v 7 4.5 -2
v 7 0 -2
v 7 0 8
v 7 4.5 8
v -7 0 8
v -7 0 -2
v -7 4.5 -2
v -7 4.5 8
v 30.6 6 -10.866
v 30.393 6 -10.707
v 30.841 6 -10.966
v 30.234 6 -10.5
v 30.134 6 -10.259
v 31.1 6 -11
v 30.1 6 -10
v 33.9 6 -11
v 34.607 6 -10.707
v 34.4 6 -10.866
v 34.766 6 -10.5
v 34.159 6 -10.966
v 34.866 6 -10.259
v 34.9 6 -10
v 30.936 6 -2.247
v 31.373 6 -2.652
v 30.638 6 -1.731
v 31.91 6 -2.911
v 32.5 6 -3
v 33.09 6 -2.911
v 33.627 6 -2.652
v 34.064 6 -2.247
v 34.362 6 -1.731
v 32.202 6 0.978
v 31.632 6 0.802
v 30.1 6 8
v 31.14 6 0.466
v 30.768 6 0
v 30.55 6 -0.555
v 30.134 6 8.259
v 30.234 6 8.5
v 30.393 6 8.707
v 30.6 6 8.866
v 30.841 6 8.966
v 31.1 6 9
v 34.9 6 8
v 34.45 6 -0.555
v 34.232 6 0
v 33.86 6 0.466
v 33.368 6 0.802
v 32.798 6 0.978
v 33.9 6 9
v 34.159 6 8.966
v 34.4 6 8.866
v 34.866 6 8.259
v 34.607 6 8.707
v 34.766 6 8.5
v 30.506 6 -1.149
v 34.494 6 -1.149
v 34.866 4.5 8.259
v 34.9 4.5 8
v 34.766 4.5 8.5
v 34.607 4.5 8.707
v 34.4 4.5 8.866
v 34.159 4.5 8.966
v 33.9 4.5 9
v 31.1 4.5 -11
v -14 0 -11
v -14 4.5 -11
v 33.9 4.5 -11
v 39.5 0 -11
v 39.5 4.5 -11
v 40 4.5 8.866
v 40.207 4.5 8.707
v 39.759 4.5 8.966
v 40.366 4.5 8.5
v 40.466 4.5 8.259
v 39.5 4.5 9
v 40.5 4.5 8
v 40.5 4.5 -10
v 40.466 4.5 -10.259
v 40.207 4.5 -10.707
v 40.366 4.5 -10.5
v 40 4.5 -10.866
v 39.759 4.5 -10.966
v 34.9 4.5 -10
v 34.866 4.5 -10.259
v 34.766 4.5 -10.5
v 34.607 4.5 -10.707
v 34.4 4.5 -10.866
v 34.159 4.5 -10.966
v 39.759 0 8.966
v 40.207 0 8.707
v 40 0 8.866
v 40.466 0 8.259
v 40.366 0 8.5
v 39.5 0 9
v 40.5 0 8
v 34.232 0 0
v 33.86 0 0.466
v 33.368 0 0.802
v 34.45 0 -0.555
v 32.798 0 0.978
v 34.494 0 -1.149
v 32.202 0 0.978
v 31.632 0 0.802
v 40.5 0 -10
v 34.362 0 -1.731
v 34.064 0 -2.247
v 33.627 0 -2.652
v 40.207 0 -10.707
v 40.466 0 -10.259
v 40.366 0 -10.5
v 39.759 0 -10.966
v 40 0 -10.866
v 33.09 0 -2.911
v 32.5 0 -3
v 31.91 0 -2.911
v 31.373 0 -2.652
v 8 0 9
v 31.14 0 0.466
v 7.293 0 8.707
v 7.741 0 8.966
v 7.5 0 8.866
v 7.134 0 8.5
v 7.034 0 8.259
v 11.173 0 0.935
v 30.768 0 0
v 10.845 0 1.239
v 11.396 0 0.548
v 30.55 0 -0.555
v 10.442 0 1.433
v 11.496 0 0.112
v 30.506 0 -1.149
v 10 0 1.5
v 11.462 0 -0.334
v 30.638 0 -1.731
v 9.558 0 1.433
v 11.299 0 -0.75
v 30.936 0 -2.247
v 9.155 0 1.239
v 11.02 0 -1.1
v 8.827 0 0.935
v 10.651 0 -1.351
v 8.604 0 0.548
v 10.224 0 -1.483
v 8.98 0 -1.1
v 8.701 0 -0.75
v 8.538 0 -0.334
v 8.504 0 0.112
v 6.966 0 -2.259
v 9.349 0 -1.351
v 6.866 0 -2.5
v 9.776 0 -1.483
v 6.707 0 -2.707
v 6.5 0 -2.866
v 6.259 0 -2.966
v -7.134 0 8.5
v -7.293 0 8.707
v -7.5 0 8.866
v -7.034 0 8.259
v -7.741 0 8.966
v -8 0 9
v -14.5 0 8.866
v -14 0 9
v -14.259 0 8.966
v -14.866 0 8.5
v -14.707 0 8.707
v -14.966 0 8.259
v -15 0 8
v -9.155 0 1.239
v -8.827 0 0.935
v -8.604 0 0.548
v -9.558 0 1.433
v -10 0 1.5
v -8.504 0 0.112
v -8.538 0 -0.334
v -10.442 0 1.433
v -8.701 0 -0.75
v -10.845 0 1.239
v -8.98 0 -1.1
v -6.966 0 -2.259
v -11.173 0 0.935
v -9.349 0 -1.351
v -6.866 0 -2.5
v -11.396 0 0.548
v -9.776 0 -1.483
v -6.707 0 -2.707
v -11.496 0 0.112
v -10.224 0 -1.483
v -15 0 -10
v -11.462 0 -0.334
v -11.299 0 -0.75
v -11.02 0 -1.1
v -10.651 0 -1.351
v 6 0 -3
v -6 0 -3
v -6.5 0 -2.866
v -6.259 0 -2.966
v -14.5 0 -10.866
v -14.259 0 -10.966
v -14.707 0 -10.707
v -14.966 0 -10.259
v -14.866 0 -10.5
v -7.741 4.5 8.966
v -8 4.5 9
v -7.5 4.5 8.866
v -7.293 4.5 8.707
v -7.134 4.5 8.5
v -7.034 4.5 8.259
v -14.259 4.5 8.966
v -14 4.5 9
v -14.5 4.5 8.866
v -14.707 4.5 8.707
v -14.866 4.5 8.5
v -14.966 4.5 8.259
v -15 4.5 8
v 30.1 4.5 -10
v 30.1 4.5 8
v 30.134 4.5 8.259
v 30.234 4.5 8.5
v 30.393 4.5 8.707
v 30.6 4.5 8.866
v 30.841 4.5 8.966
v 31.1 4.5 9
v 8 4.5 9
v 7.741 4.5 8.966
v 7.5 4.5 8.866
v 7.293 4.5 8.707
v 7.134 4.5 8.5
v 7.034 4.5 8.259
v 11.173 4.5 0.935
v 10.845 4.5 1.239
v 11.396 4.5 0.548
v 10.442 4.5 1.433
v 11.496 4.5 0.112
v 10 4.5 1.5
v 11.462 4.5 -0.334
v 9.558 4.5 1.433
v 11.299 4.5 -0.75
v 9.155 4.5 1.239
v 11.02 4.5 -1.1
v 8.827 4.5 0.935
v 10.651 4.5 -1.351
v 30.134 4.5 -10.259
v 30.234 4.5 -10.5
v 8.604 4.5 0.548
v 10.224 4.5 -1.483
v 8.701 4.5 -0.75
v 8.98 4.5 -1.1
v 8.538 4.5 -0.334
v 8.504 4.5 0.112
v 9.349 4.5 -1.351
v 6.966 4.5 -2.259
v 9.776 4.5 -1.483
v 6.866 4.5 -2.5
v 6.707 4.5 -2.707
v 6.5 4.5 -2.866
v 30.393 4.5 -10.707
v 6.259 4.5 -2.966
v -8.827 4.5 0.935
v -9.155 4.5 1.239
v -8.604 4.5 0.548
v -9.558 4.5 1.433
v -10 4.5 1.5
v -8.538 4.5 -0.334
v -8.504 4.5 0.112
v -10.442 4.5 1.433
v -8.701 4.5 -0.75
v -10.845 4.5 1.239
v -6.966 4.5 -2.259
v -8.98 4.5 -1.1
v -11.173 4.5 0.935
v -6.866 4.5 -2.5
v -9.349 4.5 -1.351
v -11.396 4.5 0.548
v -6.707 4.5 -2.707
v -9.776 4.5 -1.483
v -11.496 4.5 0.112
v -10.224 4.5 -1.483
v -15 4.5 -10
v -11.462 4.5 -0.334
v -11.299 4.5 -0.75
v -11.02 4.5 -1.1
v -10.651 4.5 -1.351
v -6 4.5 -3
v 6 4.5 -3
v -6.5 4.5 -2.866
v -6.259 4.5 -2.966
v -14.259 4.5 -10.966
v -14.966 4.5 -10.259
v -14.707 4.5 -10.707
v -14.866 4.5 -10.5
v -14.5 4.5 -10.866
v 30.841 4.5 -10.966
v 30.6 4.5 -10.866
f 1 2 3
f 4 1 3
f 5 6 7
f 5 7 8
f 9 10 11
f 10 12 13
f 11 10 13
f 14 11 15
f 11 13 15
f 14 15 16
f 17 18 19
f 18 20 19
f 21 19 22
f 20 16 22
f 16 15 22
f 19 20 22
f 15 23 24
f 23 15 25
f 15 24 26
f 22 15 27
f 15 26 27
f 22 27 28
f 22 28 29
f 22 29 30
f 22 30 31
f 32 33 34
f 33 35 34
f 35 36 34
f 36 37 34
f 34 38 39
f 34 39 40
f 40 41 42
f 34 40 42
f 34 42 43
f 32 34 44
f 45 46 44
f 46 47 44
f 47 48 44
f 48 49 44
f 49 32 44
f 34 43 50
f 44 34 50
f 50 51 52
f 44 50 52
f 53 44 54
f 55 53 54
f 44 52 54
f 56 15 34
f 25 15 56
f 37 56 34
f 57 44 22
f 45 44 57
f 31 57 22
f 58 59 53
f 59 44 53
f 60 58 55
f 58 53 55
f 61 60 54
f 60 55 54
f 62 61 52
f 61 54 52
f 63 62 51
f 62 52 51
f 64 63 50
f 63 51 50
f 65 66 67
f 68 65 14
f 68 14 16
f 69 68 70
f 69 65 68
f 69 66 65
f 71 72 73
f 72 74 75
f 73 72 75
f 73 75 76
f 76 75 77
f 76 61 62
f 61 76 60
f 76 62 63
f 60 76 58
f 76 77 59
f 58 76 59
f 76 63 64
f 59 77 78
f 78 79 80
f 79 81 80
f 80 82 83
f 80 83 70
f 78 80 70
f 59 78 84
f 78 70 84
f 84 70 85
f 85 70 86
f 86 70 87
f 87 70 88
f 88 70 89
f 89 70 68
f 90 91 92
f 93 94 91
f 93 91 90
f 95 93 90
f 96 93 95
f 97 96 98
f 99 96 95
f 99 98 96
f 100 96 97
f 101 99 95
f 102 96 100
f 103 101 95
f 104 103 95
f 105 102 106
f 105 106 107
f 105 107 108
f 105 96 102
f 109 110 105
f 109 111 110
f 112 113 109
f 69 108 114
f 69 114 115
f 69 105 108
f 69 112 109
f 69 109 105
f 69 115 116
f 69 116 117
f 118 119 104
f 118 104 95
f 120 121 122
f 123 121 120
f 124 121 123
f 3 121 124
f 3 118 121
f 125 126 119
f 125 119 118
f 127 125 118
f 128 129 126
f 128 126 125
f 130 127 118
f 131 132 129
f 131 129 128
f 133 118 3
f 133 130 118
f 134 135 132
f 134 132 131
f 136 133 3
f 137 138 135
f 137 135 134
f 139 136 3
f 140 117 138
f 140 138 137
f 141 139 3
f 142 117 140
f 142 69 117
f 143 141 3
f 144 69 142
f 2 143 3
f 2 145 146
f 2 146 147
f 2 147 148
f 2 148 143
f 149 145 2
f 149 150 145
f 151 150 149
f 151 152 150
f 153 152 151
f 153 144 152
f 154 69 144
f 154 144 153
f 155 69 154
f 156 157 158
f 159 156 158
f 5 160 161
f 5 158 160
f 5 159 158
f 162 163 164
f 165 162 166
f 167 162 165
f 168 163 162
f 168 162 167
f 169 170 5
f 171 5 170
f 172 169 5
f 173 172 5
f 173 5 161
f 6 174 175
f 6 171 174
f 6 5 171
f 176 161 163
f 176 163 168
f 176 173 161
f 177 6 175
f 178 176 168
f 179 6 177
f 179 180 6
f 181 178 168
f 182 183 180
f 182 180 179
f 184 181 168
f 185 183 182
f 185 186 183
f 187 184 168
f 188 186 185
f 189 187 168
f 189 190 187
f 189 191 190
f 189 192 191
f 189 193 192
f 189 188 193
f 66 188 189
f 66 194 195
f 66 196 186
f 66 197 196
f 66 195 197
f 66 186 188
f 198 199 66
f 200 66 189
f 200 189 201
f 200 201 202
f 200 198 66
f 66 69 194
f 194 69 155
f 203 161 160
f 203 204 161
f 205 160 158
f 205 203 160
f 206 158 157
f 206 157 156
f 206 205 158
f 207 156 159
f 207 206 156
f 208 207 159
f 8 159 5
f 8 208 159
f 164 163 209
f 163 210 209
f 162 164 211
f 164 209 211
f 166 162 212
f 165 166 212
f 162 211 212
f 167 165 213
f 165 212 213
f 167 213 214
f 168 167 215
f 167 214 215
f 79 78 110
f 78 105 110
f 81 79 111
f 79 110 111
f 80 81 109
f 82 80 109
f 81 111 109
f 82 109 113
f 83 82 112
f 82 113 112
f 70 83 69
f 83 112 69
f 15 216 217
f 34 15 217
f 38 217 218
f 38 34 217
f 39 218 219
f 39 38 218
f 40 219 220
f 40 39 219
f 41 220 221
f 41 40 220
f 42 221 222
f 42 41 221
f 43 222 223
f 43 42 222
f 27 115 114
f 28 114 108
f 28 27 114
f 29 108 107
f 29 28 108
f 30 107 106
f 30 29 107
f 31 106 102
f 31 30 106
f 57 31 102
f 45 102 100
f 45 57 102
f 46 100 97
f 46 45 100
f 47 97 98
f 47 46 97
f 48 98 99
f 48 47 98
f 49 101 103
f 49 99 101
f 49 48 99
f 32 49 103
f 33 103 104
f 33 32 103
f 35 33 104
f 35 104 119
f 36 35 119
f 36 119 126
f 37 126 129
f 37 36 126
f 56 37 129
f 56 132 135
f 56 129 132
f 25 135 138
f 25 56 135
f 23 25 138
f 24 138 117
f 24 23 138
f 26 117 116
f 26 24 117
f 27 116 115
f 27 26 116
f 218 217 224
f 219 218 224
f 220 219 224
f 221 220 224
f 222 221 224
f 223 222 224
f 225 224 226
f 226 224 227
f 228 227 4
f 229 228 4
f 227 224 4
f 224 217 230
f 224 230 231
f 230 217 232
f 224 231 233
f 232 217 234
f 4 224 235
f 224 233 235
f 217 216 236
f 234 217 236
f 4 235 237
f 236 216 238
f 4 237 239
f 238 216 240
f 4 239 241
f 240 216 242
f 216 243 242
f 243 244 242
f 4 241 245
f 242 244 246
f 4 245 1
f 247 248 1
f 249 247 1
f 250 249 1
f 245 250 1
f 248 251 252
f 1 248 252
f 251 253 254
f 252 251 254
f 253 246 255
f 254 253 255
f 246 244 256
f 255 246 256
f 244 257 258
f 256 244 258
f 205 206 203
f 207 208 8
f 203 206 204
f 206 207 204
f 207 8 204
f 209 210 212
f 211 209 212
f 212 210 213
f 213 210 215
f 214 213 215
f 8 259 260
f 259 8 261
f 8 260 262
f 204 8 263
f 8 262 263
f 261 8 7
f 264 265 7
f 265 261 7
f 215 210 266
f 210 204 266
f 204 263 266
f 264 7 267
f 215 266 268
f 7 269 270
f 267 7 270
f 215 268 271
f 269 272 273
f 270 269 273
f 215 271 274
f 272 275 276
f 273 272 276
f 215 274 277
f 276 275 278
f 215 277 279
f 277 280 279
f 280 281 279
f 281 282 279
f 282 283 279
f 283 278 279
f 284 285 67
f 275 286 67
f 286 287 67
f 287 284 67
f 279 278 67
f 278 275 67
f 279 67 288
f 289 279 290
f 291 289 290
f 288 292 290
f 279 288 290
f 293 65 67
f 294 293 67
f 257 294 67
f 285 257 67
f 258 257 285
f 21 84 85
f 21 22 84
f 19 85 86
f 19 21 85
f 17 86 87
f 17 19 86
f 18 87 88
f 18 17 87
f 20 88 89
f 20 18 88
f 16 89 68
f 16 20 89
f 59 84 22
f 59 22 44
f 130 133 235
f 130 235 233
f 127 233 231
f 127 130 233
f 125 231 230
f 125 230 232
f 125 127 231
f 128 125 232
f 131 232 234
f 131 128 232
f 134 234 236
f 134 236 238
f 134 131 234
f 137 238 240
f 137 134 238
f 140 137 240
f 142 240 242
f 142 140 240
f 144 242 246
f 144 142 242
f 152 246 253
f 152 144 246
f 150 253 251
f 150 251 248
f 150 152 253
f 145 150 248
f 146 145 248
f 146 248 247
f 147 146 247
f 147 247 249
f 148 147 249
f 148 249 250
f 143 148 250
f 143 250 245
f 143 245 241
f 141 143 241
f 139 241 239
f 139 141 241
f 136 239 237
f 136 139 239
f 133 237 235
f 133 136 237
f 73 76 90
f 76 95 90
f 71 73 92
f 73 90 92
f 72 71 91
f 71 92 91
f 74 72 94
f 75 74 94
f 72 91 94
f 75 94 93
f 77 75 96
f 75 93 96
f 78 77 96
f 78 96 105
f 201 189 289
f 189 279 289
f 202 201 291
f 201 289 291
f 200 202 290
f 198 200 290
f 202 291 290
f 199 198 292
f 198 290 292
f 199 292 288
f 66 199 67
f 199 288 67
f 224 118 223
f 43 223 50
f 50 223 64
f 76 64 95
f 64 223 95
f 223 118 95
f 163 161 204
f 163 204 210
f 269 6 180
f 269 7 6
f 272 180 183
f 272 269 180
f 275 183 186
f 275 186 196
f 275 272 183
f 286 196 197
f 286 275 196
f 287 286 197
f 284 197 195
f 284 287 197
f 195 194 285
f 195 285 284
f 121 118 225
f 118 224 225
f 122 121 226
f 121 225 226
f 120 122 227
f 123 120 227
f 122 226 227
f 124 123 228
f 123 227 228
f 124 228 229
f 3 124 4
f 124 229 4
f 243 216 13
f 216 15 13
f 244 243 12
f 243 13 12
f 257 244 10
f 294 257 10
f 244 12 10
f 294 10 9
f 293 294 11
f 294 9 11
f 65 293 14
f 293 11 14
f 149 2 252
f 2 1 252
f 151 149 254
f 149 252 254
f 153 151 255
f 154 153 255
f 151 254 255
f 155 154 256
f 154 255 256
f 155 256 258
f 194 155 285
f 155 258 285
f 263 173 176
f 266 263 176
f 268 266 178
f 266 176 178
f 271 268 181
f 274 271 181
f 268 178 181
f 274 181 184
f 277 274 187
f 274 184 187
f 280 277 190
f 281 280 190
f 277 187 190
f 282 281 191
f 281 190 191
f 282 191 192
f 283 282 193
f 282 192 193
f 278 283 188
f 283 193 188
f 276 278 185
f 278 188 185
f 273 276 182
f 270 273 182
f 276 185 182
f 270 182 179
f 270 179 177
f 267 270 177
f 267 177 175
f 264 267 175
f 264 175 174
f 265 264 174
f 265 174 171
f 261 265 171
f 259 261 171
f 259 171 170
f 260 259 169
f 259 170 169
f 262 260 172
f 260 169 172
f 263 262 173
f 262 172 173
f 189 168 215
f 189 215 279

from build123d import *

# Parameters (mm, degrees)
ESQUISSE1_R             = 1.5
BOSS_EXTRU_1_DEPTH      = 4.5
CONG_1_R                = 1
ESQUISSE2_W             = 26.5
ESQUISSE2_H             = 20
BOSS_EXTRU_2_DEPTH      = 4.5
ESQUISSE3_W             = 4.8
ESQUISSE3_H             = 20
ESQUISSE3_R             = 2
BOSS_EXTRU_3_DEPTH      = 1.5
ESQUISSE4_R             = 2
ENL_V_MAT_EXTRU_1_DEPTH = 43.207819181
CONG_2_R                = 1


with BuildPart() as part:
    # Esquisse1 → Boss.-Extru.1 (new body)
    with BuildSketch(Plane(origin=(0, 0, 0), x_dir=(1, 0, 0), z_dir=(0, 1, 0))):
        Polygon((7, -9), (15, -9), (15, 11), (0, 11), (0, 3), (7, 3), align=None)
        with Locations(Location((10, 0, 0), (0, 0, 270))):
            Circle(ESQUISSE1_R, mode=Mode.SUBTRACT)
    extrude(amount=BOSS_EXTRU_1_DEPTH)

    # Congé1
    cong_1_edges = [part.edges().sort_by_distance(p)[0] for p in [
        (7, 2.25, -3),
        (15, 2.25, -11),
        (15, 2.25, 9),
        (7, 2.25, 9),
    ]]
    fillet(cong_1_edges, radius=CONG_1_R)

    # Symétrie1: part across plane


with BuildPart() as part_1:
    add(part.part)
    add(part.part.mirror(Plane(origin=(0, 4.5, -11), x_dir=(0, 0, 1), z_dir=(1, 0, 0))))

    # Esquisse2 → Boss.-Extru.2 (add)
    with BuildSketch(Plane(origin=(0, 4.5, 0), x_dir=(1, 0, 0), z_dir=(0, 1, 0))):
        with Locations((27.25, 1)):
            Rectangle(ESQUISSE2_W, ESQUISSE2_H)
    extrude(amount=-BOSS_EXTRU_2_DEPTH)

    # Esquisse3 → Boss.-Extru.3 (add)
    with BuildSketch(Plane.XZ.offset(-4.5)):
        with Locations((32.5, -1)):
            Rectangle(ESQUISSE3_W, ESQUISSE3_H)
        with Locations(Location((32.5, -1, 0), (0, 0, 270))):
            Circle(ESQUISSE3_R, mode=Mode.SUBTRACT)
    extrude(amount=-BOSS_EXTRU_3_DEPTH)

    # Esquisse4 → Enlèv. mat.-Extru.1 (cut, through all)
    with BuildSketch(Plane.XZ.offset(-4.5)):
        with Locations(Location((32.5, -1, 0), (0, 0, 270))):
            Circle(ESQUISSE4_R)
    extrude(amount=ENL_V_MAT_EXTRU_1_DEPTH, mode=Mode.SUBTRACT)

    # Congé2
    cong_2_edges = [part_1.edges().sort_by_distance(p)[0] for p in [
        (30.1, 5.25, 9),
        (30.1, 5.25, -11),
        (34.9, 5.25, -11),
        (34.9, 5.25, 9),
        (40.5, 2.25, -11),
        (40.5, 2.25, 9),
    ]]
    fillet(cong_2_edges, radius=CONG_2_R)


solid = part_1.part
